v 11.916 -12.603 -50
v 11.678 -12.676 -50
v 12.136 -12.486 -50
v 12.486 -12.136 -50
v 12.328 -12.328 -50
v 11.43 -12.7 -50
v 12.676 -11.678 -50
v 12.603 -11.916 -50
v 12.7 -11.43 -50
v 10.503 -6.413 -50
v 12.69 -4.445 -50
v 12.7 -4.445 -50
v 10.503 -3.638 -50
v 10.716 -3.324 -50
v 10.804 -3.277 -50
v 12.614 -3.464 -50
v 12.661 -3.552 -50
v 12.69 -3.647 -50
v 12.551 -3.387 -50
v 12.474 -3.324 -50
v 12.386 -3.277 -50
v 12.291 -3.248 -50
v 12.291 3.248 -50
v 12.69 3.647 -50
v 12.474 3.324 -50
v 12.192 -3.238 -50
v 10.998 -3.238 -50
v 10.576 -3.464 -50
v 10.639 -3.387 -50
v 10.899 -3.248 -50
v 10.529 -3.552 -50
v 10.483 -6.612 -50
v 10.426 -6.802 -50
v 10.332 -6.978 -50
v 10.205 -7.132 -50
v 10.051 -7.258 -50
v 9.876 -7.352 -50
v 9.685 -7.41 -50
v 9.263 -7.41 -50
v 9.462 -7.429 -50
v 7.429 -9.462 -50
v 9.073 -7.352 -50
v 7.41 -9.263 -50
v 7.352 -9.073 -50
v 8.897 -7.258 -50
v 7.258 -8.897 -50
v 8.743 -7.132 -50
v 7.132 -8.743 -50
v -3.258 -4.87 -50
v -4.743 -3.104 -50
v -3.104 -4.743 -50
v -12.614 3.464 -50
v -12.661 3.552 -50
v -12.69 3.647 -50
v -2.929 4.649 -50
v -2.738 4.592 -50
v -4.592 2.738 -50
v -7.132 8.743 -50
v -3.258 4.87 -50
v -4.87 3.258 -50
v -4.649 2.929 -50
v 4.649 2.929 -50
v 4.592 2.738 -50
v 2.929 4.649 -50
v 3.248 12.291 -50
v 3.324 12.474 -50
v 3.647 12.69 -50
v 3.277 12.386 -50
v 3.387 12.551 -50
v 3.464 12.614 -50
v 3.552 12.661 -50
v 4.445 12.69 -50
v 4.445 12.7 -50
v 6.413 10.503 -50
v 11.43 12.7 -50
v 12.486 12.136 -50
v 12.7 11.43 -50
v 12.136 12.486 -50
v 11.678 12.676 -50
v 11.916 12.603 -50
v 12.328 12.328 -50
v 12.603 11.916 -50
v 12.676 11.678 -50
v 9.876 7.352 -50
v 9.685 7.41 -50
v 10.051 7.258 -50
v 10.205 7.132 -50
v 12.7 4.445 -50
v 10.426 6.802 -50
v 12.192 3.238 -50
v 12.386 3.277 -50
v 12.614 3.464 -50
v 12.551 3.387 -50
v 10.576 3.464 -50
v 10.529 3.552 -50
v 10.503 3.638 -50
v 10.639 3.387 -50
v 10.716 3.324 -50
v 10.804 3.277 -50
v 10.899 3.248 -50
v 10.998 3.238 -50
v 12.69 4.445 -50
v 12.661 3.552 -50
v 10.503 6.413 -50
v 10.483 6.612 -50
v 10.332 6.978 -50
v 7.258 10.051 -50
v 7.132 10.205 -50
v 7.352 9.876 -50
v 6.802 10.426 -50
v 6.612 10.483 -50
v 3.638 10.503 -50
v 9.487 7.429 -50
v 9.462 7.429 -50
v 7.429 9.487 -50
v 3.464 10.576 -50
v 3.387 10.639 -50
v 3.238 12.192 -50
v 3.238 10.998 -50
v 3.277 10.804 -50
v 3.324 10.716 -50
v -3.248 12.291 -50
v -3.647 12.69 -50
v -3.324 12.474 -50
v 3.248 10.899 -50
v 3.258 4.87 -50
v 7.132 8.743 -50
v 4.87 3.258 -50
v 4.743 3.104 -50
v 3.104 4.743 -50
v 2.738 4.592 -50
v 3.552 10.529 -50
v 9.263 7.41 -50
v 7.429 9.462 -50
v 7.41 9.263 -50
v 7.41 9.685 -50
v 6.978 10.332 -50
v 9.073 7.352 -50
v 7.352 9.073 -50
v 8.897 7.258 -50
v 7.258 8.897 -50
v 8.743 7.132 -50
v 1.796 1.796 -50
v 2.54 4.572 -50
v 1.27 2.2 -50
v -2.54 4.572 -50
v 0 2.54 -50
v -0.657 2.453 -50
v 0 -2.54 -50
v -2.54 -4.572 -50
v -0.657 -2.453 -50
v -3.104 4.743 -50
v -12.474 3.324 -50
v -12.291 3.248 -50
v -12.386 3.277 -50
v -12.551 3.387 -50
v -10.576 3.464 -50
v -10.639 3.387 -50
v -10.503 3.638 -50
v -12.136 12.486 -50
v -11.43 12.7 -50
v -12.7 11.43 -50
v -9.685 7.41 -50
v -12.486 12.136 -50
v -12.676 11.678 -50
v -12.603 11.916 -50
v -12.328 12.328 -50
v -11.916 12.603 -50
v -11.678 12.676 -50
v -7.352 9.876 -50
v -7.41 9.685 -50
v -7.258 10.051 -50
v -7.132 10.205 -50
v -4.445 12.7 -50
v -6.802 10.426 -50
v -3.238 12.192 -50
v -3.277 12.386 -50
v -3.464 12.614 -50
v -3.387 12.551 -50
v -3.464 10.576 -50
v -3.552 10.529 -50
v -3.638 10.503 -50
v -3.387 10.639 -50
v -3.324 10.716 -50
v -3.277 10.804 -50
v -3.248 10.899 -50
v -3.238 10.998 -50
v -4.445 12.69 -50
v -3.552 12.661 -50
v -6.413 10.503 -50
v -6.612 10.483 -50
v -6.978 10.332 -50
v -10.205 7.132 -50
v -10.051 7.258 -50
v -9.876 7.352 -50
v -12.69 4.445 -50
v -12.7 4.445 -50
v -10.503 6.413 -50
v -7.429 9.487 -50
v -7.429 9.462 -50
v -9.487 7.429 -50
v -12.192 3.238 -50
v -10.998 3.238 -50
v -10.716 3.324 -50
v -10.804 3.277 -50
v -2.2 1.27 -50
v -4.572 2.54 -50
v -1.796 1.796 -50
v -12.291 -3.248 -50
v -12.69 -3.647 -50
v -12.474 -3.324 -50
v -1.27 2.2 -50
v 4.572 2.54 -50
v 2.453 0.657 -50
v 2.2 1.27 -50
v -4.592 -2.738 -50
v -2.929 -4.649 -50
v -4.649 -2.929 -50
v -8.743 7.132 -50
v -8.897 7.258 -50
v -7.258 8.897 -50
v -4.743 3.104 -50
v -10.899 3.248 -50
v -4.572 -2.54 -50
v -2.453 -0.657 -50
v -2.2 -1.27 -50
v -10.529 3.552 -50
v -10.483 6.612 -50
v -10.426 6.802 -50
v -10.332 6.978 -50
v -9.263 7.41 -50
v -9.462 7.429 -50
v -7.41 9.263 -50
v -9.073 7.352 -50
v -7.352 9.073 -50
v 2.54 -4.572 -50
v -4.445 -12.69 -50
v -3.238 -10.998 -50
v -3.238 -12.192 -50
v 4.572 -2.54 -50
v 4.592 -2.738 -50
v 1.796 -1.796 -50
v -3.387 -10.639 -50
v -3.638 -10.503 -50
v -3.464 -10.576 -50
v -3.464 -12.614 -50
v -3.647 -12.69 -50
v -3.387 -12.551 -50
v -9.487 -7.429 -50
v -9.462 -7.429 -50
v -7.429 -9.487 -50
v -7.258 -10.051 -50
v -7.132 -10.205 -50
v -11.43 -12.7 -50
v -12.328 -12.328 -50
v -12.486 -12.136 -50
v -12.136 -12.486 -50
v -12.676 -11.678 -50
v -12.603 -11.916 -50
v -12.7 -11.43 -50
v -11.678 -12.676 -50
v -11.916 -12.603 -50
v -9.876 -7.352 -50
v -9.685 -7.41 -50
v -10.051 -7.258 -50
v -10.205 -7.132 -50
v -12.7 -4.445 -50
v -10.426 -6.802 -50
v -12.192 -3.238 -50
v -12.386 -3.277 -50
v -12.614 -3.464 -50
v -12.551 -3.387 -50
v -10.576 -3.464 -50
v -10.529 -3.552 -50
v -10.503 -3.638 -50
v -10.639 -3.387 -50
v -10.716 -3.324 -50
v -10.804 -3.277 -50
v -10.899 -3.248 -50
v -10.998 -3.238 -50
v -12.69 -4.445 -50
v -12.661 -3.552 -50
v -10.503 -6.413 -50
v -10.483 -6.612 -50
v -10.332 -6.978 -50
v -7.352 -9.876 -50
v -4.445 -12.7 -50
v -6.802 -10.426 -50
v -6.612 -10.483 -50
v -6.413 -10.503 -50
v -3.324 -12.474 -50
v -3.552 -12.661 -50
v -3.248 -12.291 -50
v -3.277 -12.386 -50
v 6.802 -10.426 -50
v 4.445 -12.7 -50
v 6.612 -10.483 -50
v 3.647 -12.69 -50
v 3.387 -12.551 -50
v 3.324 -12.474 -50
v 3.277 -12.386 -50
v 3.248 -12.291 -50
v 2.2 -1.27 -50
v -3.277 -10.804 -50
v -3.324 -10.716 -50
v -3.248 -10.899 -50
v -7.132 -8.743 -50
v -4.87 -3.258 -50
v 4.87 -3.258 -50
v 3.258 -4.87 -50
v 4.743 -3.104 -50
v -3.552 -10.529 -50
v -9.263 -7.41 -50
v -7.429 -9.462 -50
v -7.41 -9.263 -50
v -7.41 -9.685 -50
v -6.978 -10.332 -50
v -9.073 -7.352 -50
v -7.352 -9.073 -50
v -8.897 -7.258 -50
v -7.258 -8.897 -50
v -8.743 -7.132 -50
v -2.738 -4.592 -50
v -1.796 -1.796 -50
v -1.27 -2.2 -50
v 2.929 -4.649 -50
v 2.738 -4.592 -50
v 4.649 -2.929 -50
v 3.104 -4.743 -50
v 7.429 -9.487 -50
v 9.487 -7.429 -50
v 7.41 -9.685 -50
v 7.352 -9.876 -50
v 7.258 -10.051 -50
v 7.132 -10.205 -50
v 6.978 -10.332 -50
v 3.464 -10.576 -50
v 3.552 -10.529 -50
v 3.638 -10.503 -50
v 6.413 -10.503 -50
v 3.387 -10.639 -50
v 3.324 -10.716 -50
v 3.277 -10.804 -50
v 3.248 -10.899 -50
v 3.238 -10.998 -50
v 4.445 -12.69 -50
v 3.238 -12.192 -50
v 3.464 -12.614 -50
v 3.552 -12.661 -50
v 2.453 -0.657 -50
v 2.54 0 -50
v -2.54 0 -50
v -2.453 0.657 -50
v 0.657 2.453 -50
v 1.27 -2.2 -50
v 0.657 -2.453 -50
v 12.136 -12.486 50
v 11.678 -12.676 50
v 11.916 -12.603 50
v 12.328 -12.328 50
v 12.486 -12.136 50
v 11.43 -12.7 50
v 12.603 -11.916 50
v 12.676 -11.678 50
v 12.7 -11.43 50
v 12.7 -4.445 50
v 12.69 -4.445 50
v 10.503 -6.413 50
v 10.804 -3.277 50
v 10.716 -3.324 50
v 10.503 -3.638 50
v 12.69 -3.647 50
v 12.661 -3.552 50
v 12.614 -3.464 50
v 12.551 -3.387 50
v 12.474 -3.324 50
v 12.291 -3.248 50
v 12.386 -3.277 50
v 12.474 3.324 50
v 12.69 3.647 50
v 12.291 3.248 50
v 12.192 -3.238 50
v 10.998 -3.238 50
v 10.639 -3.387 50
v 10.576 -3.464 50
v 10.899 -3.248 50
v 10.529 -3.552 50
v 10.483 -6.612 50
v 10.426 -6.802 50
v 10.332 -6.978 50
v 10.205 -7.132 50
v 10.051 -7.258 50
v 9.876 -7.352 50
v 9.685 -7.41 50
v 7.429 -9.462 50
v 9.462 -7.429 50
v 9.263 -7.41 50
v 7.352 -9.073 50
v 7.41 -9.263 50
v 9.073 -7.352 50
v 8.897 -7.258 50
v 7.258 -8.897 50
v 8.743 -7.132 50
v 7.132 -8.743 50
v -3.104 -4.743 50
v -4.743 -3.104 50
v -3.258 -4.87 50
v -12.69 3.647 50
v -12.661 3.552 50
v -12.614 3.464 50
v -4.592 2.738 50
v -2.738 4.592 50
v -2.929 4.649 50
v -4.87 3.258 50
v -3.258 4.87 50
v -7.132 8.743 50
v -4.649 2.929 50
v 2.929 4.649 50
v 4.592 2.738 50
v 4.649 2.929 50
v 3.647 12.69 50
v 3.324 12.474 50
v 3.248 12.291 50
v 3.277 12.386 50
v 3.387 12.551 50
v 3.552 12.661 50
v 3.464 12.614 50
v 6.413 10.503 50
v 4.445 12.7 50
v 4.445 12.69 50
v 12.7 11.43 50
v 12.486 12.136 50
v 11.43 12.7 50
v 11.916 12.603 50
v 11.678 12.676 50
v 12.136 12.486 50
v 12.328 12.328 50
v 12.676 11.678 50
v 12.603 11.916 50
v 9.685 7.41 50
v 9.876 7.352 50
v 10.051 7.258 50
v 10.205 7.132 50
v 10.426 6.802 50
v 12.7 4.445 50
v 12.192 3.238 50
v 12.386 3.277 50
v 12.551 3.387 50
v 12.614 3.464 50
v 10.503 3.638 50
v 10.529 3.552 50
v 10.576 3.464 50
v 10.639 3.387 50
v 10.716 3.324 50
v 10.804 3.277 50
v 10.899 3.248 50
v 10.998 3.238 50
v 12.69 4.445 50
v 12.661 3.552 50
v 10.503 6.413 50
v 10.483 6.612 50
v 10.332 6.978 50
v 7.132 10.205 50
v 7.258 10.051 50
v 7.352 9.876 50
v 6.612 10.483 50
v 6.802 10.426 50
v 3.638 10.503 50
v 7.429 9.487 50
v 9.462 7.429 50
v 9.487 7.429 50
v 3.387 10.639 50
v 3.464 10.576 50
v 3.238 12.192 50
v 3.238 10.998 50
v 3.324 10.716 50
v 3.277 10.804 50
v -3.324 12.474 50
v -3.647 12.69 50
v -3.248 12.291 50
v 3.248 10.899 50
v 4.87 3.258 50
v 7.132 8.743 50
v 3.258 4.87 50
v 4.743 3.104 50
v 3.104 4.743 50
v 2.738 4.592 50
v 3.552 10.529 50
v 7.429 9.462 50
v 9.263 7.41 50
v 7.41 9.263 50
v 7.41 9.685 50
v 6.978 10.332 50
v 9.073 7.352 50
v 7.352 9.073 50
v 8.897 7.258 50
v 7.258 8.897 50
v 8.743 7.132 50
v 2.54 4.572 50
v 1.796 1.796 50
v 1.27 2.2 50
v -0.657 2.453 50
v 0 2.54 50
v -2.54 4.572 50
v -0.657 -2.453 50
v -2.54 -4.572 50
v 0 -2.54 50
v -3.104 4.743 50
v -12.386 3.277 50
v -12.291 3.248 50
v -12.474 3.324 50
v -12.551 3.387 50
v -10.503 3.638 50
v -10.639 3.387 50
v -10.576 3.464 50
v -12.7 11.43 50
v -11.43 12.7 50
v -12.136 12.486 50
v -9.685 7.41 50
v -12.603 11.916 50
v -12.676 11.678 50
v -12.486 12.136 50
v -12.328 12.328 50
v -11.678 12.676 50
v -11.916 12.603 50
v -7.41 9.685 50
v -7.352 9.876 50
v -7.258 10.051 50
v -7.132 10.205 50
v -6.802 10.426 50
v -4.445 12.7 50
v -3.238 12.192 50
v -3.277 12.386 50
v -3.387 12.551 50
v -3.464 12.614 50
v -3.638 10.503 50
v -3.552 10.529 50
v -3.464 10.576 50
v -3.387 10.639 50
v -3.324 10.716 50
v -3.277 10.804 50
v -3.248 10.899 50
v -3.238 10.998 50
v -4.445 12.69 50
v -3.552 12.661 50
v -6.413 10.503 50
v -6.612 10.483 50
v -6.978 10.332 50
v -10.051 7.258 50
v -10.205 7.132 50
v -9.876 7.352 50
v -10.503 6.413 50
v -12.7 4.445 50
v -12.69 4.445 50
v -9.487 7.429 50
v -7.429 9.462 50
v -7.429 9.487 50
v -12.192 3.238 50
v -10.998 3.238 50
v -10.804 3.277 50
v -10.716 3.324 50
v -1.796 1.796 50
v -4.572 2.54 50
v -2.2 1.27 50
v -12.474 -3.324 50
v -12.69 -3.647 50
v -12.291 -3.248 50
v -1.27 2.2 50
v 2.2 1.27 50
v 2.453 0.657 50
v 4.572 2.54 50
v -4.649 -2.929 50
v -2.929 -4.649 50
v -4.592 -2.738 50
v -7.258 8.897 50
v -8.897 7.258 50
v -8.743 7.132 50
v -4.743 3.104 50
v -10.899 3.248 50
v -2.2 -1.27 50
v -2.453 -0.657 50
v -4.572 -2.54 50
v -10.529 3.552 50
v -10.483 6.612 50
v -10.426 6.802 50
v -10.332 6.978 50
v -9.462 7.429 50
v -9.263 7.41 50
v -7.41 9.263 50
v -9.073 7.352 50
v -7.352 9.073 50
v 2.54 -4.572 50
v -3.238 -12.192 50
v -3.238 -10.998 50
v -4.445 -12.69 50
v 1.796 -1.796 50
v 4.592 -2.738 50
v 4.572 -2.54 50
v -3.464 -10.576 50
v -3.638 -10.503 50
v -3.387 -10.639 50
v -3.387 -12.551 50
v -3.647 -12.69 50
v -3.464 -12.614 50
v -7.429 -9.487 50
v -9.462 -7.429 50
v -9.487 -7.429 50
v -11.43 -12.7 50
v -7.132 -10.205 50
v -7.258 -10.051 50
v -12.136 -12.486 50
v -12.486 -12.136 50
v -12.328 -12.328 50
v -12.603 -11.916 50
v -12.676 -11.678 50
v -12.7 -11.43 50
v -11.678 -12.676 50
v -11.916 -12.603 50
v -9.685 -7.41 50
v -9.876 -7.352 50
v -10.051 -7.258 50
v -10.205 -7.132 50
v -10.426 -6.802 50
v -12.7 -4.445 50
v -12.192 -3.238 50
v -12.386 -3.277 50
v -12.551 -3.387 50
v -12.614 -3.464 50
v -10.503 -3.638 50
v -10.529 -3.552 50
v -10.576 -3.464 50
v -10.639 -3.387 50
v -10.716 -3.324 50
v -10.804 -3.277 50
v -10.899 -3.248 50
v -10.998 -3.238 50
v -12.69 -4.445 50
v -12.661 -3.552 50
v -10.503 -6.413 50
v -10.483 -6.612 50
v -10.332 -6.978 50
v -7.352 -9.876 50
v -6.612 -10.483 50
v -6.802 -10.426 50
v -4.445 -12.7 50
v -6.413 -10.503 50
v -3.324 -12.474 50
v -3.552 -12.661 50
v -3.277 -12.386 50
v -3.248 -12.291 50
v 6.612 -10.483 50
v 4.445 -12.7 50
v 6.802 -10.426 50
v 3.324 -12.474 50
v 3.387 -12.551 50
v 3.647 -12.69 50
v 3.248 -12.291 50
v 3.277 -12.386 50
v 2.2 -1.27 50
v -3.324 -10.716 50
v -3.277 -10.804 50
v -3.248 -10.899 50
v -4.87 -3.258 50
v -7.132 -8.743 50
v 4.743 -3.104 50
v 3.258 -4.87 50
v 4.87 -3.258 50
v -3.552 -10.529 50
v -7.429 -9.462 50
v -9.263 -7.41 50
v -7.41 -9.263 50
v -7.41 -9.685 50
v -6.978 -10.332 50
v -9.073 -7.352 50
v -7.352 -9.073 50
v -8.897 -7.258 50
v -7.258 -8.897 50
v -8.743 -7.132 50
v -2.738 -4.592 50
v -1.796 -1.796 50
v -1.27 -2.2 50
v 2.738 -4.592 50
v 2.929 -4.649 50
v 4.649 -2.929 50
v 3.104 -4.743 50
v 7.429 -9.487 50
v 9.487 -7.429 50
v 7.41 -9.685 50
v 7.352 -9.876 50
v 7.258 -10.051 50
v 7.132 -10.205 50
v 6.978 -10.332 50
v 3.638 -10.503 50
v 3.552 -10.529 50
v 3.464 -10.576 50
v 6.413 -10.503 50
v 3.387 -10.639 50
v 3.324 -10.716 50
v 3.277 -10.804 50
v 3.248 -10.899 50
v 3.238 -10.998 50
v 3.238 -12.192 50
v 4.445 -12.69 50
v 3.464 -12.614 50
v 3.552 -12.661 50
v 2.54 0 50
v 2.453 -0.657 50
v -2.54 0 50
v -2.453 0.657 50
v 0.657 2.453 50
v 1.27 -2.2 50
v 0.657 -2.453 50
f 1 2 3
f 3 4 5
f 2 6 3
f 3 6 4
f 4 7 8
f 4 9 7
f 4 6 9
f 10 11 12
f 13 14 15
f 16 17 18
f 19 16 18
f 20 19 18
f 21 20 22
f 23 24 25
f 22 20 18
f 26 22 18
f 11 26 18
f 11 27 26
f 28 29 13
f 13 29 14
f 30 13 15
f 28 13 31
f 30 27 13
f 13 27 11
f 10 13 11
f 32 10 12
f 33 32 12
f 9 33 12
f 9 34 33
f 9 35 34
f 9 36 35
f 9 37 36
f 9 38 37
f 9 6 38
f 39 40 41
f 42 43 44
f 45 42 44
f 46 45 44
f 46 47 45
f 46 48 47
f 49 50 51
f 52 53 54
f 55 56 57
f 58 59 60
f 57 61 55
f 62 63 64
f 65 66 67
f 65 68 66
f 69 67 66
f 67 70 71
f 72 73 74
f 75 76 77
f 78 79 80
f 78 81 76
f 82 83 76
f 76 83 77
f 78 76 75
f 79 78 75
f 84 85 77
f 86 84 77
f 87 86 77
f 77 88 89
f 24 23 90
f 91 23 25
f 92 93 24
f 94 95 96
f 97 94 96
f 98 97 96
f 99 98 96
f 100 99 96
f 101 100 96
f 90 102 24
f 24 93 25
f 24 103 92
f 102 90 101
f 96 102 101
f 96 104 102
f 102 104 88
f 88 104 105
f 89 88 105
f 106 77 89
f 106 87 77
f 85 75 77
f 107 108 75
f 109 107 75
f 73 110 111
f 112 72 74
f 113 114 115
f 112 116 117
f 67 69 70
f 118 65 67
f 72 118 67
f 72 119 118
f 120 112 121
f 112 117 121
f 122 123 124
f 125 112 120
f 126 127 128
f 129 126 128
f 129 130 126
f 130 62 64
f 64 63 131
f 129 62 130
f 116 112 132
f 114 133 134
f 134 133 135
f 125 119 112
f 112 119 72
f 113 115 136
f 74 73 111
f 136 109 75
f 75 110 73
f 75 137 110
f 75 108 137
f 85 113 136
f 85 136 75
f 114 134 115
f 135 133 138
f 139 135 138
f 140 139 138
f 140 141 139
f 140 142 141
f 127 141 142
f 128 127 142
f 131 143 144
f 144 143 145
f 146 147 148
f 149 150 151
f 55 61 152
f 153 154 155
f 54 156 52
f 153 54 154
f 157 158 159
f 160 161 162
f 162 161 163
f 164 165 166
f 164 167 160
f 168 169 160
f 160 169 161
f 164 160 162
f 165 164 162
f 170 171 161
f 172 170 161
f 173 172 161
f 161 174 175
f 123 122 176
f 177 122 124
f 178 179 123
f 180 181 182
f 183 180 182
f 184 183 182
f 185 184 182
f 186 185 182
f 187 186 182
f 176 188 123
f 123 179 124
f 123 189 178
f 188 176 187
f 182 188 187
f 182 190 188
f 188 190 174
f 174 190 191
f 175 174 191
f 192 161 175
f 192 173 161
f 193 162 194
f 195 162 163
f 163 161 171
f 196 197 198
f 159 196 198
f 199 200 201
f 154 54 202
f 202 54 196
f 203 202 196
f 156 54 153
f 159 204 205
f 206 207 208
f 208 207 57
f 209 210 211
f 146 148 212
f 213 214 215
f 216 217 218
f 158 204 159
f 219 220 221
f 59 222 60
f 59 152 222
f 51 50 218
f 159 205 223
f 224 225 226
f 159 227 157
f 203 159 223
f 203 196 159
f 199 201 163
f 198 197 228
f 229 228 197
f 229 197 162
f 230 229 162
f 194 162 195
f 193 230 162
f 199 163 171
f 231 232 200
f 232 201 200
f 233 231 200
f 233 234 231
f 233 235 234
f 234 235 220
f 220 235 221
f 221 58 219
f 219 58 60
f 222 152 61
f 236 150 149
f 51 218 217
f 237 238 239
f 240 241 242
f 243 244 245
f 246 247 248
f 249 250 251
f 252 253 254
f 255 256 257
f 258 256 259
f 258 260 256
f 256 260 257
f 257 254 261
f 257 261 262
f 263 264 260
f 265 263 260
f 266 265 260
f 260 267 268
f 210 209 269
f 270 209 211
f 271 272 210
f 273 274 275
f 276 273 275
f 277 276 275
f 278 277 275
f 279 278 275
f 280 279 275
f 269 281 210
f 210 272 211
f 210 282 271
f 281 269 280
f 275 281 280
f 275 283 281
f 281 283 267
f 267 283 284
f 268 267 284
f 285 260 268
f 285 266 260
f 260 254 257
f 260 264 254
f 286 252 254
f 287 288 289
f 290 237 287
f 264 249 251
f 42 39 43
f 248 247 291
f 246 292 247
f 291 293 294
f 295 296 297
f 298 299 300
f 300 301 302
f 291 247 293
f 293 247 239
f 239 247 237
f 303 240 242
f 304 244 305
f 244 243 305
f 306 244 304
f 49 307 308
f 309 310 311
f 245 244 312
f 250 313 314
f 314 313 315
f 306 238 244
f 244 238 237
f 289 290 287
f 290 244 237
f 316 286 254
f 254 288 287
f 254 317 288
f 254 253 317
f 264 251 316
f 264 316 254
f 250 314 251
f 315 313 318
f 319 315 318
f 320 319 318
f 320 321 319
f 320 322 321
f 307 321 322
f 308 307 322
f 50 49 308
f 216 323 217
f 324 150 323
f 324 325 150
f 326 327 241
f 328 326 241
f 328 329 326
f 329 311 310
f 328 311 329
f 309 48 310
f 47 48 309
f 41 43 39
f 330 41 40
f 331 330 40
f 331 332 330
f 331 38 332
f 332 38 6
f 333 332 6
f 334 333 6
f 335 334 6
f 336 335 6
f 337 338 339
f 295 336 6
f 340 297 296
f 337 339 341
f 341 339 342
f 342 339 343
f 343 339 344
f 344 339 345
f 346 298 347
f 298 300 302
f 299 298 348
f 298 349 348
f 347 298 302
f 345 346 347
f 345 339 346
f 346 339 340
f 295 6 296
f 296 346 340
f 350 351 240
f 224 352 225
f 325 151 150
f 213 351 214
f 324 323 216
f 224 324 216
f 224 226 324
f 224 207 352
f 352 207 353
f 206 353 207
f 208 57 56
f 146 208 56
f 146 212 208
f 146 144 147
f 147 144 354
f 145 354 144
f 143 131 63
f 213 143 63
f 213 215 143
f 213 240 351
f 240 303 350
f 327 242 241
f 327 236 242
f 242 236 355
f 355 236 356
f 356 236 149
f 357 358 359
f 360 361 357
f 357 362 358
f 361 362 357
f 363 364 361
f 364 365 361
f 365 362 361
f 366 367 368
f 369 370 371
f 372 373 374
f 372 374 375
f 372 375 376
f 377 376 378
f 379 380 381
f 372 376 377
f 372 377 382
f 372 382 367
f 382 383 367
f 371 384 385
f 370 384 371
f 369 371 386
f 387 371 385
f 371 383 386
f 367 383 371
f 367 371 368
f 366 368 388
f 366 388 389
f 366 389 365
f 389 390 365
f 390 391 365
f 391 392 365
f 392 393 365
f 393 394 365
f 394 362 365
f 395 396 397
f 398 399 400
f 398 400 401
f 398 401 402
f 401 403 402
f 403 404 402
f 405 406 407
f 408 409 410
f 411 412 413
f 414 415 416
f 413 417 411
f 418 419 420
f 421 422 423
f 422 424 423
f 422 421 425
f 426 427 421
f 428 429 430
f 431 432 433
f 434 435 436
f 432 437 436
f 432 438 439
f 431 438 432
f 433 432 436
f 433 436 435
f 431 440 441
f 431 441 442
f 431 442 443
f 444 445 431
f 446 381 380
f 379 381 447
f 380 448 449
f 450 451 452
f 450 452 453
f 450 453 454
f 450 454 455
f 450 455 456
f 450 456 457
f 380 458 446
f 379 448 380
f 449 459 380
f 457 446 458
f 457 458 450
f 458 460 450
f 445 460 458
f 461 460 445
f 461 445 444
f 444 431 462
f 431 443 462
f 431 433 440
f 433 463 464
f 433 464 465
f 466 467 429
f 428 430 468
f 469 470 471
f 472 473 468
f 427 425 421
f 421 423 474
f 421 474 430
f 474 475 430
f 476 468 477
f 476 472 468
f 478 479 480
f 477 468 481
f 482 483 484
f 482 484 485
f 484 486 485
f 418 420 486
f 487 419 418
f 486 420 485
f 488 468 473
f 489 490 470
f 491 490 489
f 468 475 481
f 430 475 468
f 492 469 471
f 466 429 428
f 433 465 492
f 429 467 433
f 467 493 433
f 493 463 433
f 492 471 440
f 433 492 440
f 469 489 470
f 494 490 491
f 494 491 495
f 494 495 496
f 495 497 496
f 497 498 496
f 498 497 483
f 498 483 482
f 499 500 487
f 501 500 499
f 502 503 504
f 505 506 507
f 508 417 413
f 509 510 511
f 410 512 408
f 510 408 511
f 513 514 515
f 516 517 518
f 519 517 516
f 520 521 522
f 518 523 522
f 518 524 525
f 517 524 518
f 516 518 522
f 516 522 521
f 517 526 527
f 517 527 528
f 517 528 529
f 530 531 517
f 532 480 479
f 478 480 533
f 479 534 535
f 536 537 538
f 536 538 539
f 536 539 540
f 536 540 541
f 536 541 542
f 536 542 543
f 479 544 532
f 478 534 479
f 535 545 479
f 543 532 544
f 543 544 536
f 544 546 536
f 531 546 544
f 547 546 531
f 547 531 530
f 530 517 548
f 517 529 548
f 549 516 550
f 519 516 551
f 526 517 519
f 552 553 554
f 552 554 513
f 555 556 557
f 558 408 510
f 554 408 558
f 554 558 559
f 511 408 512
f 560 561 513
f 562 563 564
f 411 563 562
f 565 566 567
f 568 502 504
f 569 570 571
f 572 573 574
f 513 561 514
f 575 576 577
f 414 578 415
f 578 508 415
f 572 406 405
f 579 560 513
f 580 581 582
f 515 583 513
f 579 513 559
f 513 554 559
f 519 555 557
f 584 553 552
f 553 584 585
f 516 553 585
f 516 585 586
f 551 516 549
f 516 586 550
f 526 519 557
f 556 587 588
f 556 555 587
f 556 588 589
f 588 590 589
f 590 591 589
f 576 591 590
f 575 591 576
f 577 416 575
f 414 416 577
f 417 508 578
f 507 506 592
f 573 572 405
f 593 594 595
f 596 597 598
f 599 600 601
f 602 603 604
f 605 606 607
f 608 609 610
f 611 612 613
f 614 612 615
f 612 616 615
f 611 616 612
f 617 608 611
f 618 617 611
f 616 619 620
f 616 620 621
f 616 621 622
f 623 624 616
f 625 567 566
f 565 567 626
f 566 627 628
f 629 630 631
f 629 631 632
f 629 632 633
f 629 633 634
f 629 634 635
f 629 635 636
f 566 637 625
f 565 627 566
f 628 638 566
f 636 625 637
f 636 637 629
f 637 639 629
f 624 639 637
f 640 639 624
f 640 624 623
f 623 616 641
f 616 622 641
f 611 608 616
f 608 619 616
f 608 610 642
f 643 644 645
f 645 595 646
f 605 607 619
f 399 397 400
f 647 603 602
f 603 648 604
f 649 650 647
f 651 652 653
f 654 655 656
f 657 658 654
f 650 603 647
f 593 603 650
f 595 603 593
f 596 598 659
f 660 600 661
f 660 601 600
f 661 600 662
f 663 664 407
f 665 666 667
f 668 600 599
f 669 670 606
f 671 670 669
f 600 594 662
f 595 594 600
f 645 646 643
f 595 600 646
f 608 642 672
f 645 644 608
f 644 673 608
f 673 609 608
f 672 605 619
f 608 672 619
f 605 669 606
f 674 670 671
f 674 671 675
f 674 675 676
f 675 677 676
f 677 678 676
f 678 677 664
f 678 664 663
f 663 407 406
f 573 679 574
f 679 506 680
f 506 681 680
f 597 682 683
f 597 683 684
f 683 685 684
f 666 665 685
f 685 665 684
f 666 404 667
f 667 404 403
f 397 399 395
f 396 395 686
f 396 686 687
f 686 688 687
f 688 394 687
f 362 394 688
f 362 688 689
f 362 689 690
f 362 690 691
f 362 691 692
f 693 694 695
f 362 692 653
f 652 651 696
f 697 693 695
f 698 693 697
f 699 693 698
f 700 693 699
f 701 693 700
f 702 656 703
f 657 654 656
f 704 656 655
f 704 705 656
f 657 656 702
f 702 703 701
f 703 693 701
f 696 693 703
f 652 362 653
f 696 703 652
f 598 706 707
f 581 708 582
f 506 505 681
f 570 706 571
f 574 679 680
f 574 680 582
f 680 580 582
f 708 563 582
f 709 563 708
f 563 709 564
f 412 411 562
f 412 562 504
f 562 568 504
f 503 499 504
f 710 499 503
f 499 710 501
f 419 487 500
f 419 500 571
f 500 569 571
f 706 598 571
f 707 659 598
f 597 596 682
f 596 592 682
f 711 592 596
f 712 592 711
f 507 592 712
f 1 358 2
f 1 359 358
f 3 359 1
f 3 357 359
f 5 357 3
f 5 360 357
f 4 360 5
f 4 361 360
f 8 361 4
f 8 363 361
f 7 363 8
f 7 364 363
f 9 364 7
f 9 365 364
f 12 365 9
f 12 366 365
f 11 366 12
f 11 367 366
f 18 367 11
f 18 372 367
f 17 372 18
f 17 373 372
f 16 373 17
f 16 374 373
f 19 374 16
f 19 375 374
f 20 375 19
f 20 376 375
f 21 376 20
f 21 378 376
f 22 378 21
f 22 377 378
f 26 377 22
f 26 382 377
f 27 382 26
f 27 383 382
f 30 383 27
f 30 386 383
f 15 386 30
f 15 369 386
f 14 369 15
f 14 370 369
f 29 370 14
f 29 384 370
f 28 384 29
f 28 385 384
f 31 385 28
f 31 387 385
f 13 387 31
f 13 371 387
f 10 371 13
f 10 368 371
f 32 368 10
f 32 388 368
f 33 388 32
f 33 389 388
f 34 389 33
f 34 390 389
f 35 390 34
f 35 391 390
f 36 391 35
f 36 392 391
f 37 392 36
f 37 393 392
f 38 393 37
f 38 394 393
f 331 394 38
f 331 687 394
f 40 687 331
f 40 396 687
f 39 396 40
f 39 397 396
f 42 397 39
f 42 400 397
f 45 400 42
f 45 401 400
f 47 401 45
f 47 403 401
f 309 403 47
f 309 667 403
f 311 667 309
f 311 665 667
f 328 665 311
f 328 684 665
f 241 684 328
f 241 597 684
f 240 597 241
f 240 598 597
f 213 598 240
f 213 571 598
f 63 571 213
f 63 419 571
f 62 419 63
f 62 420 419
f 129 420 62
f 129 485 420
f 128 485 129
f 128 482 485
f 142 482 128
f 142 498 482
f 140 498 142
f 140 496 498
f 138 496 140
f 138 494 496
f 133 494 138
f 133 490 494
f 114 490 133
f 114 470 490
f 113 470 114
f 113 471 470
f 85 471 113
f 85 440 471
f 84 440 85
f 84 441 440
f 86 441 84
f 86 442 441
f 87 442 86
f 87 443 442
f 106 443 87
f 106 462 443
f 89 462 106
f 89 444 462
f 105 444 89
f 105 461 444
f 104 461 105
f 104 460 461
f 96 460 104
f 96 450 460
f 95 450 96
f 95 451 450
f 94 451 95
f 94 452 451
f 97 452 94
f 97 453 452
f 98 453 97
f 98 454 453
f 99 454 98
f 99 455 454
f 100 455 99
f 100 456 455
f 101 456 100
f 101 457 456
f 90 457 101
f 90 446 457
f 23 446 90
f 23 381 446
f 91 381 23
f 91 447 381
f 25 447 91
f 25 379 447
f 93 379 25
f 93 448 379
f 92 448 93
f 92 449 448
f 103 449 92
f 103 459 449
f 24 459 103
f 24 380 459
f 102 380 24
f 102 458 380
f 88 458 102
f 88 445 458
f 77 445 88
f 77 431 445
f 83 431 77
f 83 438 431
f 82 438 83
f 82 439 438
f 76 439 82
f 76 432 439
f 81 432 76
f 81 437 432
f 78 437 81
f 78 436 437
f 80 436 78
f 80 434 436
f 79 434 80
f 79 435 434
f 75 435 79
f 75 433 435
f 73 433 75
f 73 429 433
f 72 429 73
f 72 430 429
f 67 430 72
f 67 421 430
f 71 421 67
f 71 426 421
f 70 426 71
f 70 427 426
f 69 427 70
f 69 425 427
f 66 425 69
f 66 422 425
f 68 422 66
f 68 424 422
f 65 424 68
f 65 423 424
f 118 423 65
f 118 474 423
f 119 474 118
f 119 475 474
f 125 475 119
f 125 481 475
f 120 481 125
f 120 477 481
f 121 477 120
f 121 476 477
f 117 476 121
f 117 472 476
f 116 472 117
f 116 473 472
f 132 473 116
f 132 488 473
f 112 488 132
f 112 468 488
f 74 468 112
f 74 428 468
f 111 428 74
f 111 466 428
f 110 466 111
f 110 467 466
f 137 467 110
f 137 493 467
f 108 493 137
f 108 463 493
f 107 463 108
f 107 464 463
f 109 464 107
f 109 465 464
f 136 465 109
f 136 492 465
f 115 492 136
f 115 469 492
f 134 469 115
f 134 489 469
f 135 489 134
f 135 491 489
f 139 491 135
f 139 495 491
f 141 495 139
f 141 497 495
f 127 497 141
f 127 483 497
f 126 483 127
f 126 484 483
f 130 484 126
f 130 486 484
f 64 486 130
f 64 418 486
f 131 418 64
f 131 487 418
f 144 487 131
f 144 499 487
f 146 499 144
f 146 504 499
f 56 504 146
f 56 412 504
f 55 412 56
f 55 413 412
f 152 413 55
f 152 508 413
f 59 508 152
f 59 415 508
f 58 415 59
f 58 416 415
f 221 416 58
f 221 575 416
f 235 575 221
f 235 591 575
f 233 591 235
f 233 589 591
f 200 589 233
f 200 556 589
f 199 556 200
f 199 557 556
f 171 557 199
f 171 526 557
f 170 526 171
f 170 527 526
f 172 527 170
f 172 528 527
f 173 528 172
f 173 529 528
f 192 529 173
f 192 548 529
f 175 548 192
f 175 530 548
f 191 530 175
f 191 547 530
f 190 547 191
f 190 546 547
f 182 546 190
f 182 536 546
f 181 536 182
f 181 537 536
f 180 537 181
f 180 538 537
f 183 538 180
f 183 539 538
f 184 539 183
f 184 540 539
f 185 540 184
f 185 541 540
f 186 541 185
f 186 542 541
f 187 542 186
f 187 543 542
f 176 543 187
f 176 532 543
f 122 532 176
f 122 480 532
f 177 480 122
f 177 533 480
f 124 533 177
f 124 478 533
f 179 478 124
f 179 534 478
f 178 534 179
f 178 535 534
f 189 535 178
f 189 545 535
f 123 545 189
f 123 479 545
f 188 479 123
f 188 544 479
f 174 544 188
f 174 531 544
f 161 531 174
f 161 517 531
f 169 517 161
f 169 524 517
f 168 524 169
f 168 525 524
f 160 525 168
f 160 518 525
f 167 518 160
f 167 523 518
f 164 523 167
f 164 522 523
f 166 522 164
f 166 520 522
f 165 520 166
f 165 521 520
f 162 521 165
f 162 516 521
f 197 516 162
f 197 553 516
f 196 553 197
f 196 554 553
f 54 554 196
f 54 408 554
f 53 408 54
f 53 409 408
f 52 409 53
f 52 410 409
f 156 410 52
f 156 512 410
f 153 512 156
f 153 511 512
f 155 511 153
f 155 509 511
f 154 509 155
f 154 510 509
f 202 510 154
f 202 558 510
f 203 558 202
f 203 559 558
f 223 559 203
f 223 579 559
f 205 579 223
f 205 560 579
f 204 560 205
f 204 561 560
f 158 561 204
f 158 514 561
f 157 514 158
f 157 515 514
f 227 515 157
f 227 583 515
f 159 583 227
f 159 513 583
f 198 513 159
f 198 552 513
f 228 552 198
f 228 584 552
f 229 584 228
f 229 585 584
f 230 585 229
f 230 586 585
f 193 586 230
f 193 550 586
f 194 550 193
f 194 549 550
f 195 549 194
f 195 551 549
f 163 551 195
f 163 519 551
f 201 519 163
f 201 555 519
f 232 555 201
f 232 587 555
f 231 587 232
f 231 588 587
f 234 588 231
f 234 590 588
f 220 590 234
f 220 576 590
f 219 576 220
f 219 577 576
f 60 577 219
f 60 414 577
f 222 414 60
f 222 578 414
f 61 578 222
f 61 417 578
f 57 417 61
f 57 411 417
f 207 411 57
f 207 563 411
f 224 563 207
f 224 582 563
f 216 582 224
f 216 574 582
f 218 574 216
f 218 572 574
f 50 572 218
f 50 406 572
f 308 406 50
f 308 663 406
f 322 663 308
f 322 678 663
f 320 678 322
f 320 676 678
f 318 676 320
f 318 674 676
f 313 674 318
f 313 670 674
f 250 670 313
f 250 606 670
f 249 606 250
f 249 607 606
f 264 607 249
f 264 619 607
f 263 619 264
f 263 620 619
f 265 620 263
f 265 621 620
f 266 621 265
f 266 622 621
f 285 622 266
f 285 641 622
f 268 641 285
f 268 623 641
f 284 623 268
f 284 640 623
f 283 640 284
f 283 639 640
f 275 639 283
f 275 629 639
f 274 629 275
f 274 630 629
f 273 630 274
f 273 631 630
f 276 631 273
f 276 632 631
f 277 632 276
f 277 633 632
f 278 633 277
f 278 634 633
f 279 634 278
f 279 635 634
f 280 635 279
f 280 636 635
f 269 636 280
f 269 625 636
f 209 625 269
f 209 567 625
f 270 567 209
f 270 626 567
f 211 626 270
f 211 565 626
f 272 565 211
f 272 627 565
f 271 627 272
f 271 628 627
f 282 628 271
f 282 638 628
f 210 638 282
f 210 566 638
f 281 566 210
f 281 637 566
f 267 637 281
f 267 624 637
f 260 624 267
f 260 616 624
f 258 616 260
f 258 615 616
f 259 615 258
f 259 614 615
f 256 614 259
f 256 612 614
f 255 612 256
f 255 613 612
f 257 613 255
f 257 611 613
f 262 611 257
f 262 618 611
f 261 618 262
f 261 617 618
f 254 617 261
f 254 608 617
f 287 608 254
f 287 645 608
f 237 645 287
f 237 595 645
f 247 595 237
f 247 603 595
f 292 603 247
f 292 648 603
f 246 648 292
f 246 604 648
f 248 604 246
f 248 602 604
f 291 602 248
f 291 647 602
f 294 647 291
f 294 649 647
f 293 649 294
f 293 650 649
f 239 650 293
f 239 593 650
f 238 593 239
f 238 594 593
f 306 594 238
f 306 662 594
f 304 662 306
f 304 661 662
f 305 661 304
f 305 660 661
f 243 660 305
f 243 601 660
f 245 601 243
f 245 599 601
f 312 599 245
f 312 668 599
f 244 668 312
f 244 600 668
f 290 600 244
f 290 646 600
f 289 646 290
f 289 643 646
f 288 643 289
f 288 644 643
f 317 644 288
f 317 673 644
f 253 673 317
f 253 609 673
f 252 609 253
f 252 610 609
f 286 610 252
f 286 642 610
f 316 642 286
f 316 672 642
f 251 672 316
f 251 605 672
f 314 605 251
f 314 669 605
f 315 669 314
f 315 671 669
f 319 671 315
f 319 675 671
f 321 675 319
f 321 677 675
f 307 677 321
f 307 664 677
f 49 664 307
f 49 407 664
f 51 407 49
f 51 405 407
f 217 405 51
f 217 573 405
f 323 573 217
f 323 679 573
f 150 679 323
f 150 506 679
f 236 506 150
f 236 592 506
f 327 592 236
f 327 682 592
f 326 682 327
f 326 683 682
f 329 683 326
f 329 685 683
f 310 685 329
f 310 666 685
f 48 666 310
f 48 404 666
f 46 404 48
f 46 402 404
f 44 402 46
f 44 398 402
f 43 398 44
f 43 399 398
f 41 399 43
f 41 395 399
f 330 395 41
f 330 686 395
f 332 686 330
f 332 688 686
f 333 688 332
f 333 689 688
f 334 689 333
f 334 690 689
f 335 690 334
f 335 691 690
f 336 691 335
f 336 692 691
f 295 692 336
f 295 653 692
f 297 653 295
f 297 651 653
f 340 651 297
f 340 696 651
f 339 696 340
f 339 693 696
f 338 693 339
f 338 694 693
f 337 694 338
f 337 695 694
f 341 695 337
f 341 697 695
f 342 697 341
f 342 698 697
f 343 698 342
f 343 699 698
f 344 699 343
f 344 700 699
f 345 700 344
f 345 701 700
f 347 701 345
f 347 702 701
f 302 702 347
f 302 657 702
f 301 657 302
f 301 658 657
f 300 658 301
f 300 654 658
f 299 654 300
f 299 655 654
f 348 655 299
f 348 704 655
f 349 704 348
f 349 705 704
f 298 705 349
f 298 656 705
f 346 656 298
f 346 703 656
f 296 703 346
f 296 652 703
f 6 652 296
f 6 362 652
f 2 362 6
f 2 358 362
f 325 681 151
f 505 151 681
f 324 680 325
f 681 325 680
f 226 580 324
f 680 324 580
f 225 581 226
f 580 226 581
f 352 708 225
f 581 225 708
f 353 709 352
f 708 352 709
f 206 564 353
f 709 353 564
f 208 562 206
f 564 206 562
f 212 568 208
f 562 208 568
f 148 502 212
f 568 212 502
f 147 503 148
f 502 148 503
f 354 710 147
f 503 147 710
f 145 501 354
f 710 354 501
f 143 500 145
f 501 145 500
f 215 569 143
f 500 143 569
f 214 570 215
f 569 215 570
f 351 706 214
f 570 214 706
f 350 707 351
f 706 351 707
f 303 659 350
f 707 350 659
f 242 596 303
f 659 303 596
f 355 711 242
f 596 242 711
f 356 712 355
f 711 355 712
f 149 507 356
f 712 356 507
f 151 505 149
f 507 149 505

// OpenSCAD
/*
*   Generic library for fractional t-slot extrusions.
*   Rev. 1
*
*  Creative Commons Share Alike 3.0
*  Copyright (c) 2013 David Lee Miller
* 
*/

minkR_TS = 0.04*25.4;   // minkowski radius for the t-slot
minkR_IC = 0.075*25.4;   // minkowski radius for the inner cutout
minkR_PF = 0.05*25.4;   // minkowski radius for the profile corners

1010Profile(100);
//1020Profile(100);
//1030Profile(100);
//2020Profile(100);
//2040Profile(100);


module fillet(rad){
	translate([-rad,-rad,0])
	difference(){
		translate([0,0,0]) square([rad+0.01,rad+0.01]);
		circle(r=rad,center=true,$fn=32);
	}
}

module insideCutout(){
	minkowski(){
		translate([0,0,0]) circle(r=minkR_IC,center=true,$fn=32);
		hull(){
			square([0.2*25.4-minkR_IC,0.645*25.4-2*minkR_IC],center=true);
			square([0.8*25.4-2*minkR_IC,0.001*25.4],center=true);
		}
	}
}

module doubleCutout(){
	union(){
		minkowski(){
			translate([0,0,0]) circle(r=minkR_IC,center=true,$fn=32);
			union(){
			rotate([0,0,0]) hull(){
				translate([-0.5*25.4,0,0]) hull(){
					square([0.2*25.4-minkR_IC,0.645*25.4-2*minkR_IC],center=true);
					square([0.8*25.4-2*minkR_IC,0.001*25.4],center=true);
				}
				translate([0.5*25.4,0,0]) hull(){
					square([0.2*25.4-minkR_IC,0.645*25.4-2*minkR_IC],center=true);
					square([0.8*25.4-2*minkR_IC,0.001*25.4],center=true);
				}
			}
			rotate([0,0,90]) hull(){
				translate([-0.5*25.4,0,0]) hull(){
					square([0.2*25.4-minkR_IC,0.645*25.4-2*minkR_IC],center=true);
					square([0.8*25.4-2*minkR_IC,0.001*25.4],center=true);
				}
				translate([0.5*25.4,0,0]) hull(){
					square([0.2*25.4-minkR_IC,0.645*25.4-2*minkR_IC],center=true);
					square([0.8*25.4-2*minkR_IC,0.001*25.4],center=true);
				}
			}}
		}
		rotate([0,0,0]) translate([-0.645*25.4/2,-0.645*25.4/2,0]) fillet(minkR_IC);
		rotate([0,0,180]) translate([-0.645*25.4/2,-0.645*25.4/2,0]) fillet(minkR_IC);
		rotate([0,0,90]) translate([-0.645*25.4/2,-0.645*25.4/2,0]) fillet(minkR_IC);
		rotate([0,0,-90]) translate([-0.645*25.4/2,-0.645*25.4/2,0]) fillet(minkR_IC);
	}
}

module tSlot(){
	union(){
		translate([minkR_TS,0,0])
		minkowski(){
			translate([0,0,0]) circle(r=minkR_TS,center=true,$fn=32);
			hull(){
				square([0.001*25.4,0.585*25.4-2*minkR_TS],center=true);
				translate([(0.233*25.4-2*minkR_TS)/2,0,0]) square([0.233*25.4-2*minkR_TS,0.2*25.4],center=true);
			}
		}
	translate([-0.255*25.4/2+0.01,0,0]) square(0.255*25.4,center=true);
	translate([-0.35*25.4/2-0.087*25.4+0.01,0,0]) square(0.35*25.4,center=true);
	translate([0,-0.255*25.4/2,0]) fillet(minkR_TS/2);
	translate([-0.087*25.4,-.255*25.4/2,0]) rotate([0,0,90]) fillet(minkR_TS/2);
	scale([1,-1,1]) translate([0,-0.255*25.4/2,0]) fillet(minkR_TS/2);
	scale([1,-1,1]) translate([-0.087*25.4,-.255*25.4/2,0]) rotate([0,0,90]) fillet(minkR_TS/2);
	}
}

module 1010Profile(height){
	linear_extrude(height=height,center=true)
	union(){
	difference(){
		minkowski(){
			translate([0,0,0]) circle(r=minkR_PF,center=true,$fn=32);
			square([1*25.4-2*minkR_PF,1*25.4-2*minkR_PF],center=true);
		}
		translate([0,0,0]) circle(r=0.2*25.4/2,$fn=24);
		translate([-0.5*25.4+0.087*25.4,0,0]) tSlot();
		rotate([0,0,180]) translate([-0.5*25.4+0.087*25.4,0,0]) tSlot();
		translate([0,-0.5*25.4+0.087*25.4,0]) rotate([0,0,90]) tSlot();
		translate([0,0.5*25.4-0.087*25.4,0]) rotate([0,0,-90]) tSlot();
	}}
}

module 1020Profile(height){
	linear_extrude(height=height,center=true)
	difference(){
		minkowski(){
			translate([0,0,0]) circle(r=minkR_PF,center=true,$fn=32);
			square([1*25.4-2*minkR_PF,2*25.4-2*minkR_PF],center=true);
		}
		translate([0,0.5*25.4,0]) circle(r=0.2*25.4/2,$fn=24);
		translate([0,-0.5*25.4,0]) circle(r=0.2*25.4/2,$fn=24);
		translate([0,0,0]) insideCutout();
		translate([-0.5*25.4+0.087*25.4,0.5*25.4,0]) tSlot();
		rotate([0,0,180]) translate([-0.5*25.4+0.087*25.4,0.5*25.4,0]) tSlot();
		translate([-0.5*25.4+0.087*25.4,-0.5*25.4,0]) tSlot();
		rotate([0,0,180]) translate([-0.5*25.4+0.087*25.4,-0.5*25.4,0]) tSlot();
		translate([0,-1*25.4+0.087*25.4,0]) rotate([0,0,90]) tSlot();
		translate([0,1*25.4-0.087*25.4,0]) rotate([0,0,-90]) tSlot();
	}
}

module 1030Profile(height){
	linear_extrude(height=height,center=true)
	difference(){
		minkowski(){
			translate([0,0,0]) circle(r=minkR_PF,center=true,$fn=32);
			square([1*25.4-2*minkR_PF,3*25.4-2*minkR_PF],center=true);
		}
		translate([0,0,0]) circle(r=0.2*25.4/2,$fn=24);
		translate([0,1*25.4,0]) circle(r=0.2*25.4/2,$fn=24);
		translate([0,-1*25.4,0]) circle(r=0.2*25.4/2,$fn=24);
		translate([0,-0.5*25.4,0]) insideCutout();
		translate([0,0.5*25.4,0]) insideCutout();
		translate([-0.5*25.4+0.087*25.4,0,0]) tSlot();
		rotate([0,0,180]) translate([-0.5*25.4+0.087*25.4,0,0]) tSlot();
		translate([-0.5*25.4+0.087*25.4,1*25.4,0]) tSlot();
		rotate([0,0,180]) translate([-0.5*25.4+0.087*25.4,1*25.4,0]) tSlot();
		translate([-0.5*25.4+0.087*25.4,-1*25.4,0]) tSlot();
		rotate([0,0,180]) translate([-0.5*25.4+0.087*25.4,-1*25.4,0]) tSlot();
		translate([0,-1.5*25.4+0.087*25.4,0]) rotate([0,0,90]) tSlot();
		translate([0,1.5*25.4-0.087*25.4,0]) rotate([0,0,-90]) tSlot();
	}
}

module 2020Profile(height){
	linear_extrude(height=height,center=true)
	difference(){
		minkowski(){
			translate([0,0,0]) circle(r=minkR_PF,center=true,$fn=32);
			square([2*25.4-2*minkR_PF,2*25.4-2*minkR_PF],center=true);
		}
		translate([0.5*25.4,0.5*25.4,0]) circle(r=0.2*25.4/2,$fn=24);
		translate([-0.5*25.4,0.5*25.4,0]) circle(r=0.2*25.4/2,$fn=24);
		translate([0.5*25.4,-0.5*25.4,0]) circle(r=0.2*25.4/2,$fn=24);
		translate([-0.5*25.4,-0.5*25.4,0]) circle(r=0.2*25.4/2,$fn=24);
		translate([0,0,0]) doubleCutout();
		translate([-1*25.4+0.087*25.4,0.5*25.4,0]) tSlot();
		rotate([0,0,180]) translate([-1*25.4+0.087*25.4,0.5*25.4,0]) tSlot();
		translate([-1*25.4+0.087*25.4,-0.5*25.4,0]) tSlot();
		rotate([0,0,180]) translate([-1*25.4+0.087*25.4,-0.5*25.4,0]) tSlot();
		translate([-0.5*25.4,1*25.4-0.087*25.4,0]) rotate([0,0,-90]) tSlot();
		rotate([0,0,180]) translate([-0.5*25.4,1*25.4-0.087*25.4,0]) rotate([0,0,-90]) tSlot();
		translate([0.5*25.4,1*25.4-0.087*25.4,0]) rotate([0,0,-90]) tSlot();
		rotate([0,0,180]) translate([0.5*25.4,1*25.4-0.087*25.4,0]) rotate([0,0,-90]) tSlot();
	}
}

module 2040Profile(height){
	linear_extrude(height=height,center=true)
	difference(){
		minkowski(){
			translate([0,0,0]) circle(r=minkR_PF,center=true,$fn=32);
			square([2*25.4-2*minkR_PF,4*25.4-2*minkR_PF],center=true);
		}
		translate([0.5*25.4,1.5*25.4,0]) circle(r=0.2*25.4/2,$fn=24);
		translate([-0.5*25.4,1.5*25.4,0]) circle(r=0.2*25.4/2,$fn=24);
		translate([0.5*25.4,0.5*25.4,0]) circle(r=0.2*25.4/2,$fn=24);
		translate([-0.5*25.4,0.5*25.4,0]) circle(r=0.2*25.4/2,$fn=24);
		translate([0.5*25.4,-1.5*25.4,0]) circle(r=0.2*25.4/2,$fn=24);
		translate([-0.5*25.4,-1.5*25.4,0]) circle(r=0.2*25.4/2,$fn=24);
		translate([0.5*25.4,-0.5*25.4,0]) circle(r=0.2*25.4/2,$fn=24);
		translate([-0.5*25.4,-0.5*25.4,0]) circle(r=0.2*25.4/2,$fn=24);
		translate([0,1*25.4,0]) doubleCutout();
		translate([0,-1*25.4,0]) doubleCutout();
		translate([0.5*25.4,0,0]) insideCutout();
		translate([-0.5*25.4,0,0]) insideCutout();
		translate([-1*25.4+0.087*25.4,0.5*25.4,0]) tSlot();
		rotate([0,0,180]) translate([-1*25.4+0.087*25.4,0.5*25.4,0]) tSlot();
		translate([-1*25.4+0.087*25.4,-0.5*25.4,0]) tSlot();
		rotate([0,0,180]) translate([-1*25.4+0.087*25.4,-0.5*25.4,0]) tSlot();
		translate([-1*25.4+0.087*25.4,1.5*25.4,0]) tSlot();
		rotate([0,0,180]) translate([-1*25.4+0.087*25.4,1.5*25.4,0]) tSlot();
		translate([-1*25.4+0.087*25.4,-1.5*25.4,0]) tSlot();
		rotate([0,0,180]) translate([-1*25.4+0.087*25.4,-1.5*25.4,0]) tSlot();
		translate([-0.5*25.4,2*25.4-0.087*25.4,0]) rotate([0,0,-90]) tSlot();
		rotate([0,0,180]) translate([-0.5*25.4,2*25.4-0.087*25.4,0]) rotate([0,0,-90]) tSlot();
		translate([0.5*25.4,2*25.4-0.087*25.4,0]) rotate([0,0,-90]) tSlot();
		rotate([0,0,180]) translate([0.5*25.4,2*25.4-0.087*25.4,0]) rotate([0,0,-90]) tSlot();
	}
}
